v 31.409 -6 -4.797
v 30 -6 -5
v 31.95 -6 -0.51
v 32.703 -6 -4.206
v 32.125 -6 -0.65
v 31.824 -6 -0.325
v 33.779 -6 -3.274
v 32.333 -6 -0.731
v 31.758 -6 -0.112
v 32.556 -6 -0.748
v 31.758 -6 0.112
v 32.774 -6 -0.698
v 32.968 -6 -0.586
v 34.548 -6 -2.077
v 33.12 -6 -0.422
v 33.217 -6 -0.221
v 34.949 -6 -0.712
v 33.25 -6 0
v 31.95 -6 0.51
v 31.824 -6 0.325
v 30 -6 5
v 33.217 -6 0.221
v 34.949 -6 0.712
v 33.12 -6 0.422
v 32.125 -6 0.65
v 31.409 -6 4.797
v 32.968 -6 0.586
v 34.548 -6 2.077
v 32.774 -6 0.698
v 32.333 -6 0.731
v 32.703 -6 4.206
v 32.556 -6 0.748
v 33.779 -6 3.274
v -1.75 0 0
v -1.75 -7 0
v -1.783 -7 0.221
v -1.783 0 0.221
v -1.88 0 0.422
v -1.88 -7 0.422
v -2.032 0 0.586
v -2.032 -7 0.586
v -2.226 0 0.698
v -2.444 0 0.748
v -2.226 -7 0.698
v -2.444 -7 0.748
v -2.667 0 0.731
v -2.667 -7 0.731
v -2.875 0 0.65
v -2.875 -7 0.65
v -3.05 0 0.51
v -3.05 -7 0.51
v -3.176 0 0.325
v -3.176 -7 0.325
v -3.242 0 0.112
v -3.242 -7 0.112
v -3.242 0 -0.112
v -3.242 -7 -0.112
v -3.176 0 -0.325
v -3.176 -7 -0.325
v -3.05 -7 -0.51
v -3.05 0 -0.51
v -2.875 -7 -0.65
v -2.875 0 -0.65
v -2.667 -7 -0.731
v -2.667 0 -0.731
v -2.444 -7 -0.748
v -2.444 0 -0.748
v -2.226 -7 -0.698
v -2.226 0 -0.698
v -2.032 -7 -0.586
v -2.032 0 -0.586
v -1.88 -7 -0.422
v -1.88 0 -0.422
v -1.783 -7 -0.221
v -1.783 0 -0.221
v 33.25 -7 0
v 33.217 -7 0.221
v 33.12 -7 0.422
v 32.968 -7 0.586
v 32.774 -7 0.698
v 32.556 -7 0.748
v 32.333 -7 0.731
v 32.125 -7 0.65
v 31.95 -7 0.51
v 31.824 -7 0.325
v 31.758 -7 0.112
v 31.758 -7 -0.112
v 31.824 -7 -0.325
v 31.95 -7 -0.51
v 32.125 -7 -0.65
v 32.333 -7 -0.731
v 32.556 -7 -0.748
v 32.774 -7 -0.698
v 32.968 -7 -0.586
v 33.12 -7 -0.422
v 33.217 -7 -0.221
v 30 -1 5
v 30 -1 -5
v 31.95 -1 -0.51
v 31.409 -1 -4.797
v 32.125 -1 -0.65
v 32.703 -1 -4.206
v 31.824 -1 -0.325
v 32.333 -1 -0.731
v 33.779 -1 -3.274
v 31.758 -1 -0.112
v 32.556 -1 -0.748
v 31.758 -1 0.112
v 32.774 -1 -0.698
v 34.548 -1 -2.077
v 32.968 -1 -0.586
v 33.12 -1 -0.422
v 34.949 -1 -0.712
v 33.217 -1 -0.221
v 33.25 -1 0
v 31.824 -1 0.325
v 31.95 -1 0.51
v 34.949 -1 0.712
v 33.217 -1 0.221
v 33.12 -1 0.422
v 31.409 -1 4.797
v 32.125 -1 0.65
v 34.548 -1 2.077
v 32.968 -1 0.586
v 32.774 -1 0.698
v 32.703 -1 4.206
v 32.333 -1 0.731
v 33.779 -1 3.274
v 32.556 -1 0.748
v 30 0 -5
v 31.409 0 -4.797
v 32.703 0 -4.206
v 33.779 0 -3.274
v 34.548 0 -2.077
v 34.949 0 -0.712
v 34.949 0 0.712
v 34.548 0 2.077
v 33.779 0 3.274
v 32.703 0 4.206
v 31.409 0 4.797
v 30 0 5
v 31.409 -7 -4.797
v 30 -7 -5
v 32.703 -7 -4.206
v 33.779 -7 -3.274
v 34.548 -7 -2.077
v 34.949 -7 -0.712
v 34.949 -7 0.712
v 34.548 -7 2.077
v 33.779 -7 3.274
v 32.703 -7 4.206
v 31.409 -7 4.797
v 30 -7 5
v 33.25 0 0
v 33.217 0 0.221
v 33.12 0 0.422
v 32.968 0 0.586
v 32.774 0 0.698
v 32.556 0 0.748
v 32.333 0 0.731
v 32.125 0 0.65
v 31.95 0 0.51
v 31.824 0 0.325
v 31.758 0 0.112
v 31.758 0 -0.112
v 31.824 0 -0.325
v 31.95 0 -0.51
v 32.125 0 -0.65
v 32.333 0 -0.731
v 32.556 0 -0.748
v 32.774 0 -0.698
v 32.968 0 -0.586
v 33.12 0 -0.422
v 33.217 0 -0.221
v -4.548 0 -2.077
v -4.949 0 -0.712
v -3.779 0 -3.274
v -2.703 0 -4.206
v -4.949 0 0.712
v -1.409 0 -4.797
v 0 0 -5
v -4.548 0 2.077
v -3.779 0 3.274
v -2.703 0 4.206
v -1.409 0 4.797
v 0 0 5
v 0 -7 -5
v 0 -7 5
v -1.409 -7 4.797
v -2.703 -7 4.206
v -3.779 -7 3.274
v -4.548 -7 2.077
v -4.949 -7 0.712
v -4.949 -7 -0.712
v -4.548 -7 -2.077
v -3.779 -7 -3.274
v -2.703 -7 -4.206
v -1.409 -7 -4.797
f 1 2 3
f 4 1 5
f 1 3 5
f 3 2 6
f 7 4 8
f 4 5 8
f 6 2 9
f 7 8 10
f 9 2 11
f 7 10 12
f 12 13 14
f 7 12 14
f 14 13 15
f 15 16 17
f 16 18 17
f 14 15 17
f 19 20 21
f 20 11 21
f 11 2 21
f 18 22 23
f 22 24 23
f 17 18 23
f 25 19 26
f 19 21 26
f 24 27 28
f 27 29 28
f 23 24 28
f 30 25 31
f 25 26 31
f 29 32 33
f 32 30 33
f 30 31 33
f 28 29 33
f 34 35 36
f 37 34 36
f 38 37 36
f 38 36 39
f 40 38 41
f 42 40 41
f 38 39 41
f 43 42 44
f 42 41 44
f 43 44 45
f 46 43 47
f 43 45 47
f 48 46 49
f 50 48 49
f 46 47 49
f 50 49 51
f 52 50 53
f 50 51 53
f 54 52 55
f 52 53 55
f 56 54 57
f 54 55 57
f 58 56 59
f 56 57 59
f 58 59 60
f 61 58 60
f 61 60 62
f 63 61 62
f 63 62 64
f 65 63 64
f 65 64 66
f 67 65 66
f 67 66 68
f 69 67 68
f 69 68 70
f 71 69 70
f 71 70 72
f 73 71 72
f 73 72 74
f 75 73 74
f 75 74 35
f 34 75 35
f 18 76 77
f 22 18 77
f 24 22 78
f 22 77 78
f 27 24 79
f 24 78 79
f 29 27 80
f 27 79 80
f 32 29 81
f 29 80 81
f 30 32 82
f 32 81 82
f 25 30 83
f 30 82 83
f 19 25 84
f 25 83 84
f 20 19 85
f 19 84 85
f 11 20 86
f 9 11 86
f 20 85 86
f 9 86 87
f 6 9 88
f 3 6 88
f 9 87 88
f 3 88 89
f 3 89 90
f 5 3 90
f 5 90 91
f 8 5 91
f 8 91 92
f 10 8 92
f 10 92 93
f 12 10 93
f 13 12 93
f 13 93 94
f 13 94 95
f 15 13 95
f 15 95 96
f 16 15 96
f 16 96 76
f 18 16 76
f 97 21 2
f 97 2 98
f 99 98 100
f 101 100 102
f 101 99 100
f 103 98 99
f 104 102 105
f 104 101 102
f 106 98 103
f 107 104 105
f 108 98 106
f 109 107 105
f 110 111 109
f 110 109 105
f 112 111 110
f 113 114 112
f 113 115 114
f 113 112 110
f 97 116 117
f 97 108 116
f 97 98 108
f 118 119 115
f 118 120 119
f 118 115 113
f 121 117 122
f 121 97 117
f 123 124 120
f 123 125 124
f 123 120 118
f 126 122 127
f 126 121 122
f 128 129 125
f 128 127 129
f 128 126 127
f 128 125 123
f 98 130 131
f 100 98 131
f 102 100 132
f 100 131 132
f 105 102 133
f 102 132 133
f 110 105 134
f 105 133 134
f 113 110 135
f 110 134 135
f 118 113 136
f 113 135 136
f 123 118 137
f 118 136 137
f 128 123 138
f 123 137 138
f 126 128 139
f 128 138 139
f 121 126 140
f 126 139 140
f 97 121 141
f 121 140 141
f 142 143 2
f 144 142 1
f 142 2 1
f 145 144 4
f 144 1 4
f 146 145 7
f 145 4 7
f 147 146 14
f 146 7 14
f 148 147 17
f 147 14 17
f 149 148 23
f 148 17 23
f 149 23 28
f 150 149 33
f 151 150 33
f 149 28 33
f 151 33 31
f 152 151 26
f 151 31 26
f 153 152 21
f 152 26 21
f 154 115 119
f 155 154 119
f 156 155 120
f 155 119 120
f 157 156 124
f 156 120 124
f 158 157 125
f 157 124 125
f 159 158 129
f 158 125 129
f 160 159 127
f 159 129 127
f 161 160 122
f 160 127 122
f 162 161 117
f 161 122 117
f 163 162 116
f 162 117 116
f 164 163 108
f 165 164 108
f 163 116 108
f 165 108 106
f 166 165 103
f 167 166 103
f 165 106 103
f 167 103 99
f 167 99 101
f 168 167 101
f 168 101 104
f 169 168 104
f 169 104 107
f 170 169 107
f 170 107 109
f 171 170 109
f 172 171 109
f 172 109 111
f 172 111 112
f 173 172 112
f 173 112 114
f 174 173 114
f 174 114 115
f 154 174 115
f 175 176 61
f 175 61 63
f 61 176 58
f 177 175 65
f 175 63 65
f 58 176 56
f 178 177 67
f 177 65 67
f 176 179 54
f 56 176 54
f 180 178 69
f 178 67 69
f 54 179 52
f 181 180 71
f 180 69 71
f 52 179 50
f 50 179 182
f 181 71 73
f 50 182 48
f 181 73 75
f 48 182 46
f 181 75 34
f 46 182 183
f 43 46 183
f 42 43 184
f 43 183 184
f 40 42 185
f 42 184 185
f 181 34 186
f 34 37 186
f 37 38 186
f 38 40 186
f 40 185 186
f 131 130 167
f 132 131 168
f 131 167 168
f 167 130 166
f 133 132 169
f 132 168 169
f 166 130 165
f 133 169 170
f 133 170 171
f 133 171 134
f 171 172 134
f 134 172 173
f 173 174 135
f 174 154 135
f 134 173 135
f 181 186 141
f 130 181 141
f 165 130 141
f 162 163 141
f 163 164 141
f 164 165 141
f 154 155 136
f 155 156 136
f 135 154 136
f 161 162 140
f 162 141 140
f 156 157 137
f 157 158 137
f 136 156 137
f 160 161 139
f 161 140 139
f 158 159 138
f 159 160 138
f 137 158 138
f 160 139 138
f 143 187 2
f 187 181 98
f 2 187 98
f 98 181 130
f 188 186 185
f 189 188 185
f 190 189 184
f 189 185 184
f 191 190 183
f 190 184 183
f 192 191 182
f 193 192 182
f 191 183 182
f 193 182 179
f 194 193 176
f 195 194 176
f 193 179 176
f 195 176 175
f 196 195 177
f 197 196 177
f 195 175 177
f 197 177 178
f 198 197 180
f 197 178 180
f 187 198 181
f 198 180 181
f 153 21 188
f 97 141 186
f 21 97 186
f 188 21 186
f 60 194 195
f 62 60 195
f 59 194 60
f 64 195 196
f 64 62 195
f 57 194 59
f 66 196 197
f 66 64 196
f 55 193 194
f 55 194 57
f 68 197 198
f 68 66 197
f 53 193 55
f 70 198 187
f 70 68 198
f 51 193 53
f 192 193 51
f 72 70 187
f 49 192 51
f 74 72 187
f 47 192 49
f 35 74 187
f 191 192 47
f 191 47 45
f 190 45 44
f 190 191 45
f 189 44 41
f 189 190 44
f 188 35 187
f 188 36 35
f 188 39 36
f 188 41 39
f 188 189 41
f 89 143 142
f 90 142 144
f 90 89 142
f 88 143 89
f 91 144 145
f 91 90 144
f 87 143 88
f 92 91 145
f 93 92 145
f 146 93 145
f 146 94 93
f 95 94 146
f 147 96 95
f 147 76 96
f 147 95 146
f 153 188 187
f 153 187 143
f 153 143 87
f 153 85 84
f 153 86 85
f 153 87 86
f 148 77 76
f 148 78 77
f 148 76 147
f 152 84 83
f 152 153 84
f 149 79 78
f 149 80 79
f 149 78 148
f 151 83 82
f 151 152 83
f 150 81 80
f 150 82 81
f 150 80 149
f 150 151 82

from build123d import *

# Parameters (mm, degrees)
F1_DEPTH = 7
F2_W     = 5.193473
F2_H     = 5
F3_DEPTH = 25
F4_R     = 0.75
F5_DEPTH = 25


with BuildPart() as f1:
    # F0 (on Front) → F1 (new body)
    with BuildSketch(Plane.XZ):
        with BuildLine():
            Line((30, 5), (0, 5))
            ThreePointArc((0, 5), (-5, 0), (0, -5))
            Line((0, -5), (30, -5))
            ThreePointArc((30, -5), (35, 0), (30, 5))
        make_face()
    extrude(amount=F1_DEPTH)

    # F2 (on face) → F3 (cut)
    with BuildSketch(Plane.XY.offset(5)):
        with Locations((32.596736, -3.5)):
            Rectangle(F2_W, F2_H)
    extrude(amount=-F3_DEPTH, mode=Mode.SUBTRACT)

    # F4 (on face) → F5 (cut)
    with BuildSketch(Plane.XZ.offset(7)):
        with Locations((32.5, 0)):
            Circle(F4_R)
        with Locations((-2.5, 0)):
            Circle(F4_R)
    extrude(amount=-F5_DEPTH, mode=Mode.SUBTRACT)


solid = f1.part
